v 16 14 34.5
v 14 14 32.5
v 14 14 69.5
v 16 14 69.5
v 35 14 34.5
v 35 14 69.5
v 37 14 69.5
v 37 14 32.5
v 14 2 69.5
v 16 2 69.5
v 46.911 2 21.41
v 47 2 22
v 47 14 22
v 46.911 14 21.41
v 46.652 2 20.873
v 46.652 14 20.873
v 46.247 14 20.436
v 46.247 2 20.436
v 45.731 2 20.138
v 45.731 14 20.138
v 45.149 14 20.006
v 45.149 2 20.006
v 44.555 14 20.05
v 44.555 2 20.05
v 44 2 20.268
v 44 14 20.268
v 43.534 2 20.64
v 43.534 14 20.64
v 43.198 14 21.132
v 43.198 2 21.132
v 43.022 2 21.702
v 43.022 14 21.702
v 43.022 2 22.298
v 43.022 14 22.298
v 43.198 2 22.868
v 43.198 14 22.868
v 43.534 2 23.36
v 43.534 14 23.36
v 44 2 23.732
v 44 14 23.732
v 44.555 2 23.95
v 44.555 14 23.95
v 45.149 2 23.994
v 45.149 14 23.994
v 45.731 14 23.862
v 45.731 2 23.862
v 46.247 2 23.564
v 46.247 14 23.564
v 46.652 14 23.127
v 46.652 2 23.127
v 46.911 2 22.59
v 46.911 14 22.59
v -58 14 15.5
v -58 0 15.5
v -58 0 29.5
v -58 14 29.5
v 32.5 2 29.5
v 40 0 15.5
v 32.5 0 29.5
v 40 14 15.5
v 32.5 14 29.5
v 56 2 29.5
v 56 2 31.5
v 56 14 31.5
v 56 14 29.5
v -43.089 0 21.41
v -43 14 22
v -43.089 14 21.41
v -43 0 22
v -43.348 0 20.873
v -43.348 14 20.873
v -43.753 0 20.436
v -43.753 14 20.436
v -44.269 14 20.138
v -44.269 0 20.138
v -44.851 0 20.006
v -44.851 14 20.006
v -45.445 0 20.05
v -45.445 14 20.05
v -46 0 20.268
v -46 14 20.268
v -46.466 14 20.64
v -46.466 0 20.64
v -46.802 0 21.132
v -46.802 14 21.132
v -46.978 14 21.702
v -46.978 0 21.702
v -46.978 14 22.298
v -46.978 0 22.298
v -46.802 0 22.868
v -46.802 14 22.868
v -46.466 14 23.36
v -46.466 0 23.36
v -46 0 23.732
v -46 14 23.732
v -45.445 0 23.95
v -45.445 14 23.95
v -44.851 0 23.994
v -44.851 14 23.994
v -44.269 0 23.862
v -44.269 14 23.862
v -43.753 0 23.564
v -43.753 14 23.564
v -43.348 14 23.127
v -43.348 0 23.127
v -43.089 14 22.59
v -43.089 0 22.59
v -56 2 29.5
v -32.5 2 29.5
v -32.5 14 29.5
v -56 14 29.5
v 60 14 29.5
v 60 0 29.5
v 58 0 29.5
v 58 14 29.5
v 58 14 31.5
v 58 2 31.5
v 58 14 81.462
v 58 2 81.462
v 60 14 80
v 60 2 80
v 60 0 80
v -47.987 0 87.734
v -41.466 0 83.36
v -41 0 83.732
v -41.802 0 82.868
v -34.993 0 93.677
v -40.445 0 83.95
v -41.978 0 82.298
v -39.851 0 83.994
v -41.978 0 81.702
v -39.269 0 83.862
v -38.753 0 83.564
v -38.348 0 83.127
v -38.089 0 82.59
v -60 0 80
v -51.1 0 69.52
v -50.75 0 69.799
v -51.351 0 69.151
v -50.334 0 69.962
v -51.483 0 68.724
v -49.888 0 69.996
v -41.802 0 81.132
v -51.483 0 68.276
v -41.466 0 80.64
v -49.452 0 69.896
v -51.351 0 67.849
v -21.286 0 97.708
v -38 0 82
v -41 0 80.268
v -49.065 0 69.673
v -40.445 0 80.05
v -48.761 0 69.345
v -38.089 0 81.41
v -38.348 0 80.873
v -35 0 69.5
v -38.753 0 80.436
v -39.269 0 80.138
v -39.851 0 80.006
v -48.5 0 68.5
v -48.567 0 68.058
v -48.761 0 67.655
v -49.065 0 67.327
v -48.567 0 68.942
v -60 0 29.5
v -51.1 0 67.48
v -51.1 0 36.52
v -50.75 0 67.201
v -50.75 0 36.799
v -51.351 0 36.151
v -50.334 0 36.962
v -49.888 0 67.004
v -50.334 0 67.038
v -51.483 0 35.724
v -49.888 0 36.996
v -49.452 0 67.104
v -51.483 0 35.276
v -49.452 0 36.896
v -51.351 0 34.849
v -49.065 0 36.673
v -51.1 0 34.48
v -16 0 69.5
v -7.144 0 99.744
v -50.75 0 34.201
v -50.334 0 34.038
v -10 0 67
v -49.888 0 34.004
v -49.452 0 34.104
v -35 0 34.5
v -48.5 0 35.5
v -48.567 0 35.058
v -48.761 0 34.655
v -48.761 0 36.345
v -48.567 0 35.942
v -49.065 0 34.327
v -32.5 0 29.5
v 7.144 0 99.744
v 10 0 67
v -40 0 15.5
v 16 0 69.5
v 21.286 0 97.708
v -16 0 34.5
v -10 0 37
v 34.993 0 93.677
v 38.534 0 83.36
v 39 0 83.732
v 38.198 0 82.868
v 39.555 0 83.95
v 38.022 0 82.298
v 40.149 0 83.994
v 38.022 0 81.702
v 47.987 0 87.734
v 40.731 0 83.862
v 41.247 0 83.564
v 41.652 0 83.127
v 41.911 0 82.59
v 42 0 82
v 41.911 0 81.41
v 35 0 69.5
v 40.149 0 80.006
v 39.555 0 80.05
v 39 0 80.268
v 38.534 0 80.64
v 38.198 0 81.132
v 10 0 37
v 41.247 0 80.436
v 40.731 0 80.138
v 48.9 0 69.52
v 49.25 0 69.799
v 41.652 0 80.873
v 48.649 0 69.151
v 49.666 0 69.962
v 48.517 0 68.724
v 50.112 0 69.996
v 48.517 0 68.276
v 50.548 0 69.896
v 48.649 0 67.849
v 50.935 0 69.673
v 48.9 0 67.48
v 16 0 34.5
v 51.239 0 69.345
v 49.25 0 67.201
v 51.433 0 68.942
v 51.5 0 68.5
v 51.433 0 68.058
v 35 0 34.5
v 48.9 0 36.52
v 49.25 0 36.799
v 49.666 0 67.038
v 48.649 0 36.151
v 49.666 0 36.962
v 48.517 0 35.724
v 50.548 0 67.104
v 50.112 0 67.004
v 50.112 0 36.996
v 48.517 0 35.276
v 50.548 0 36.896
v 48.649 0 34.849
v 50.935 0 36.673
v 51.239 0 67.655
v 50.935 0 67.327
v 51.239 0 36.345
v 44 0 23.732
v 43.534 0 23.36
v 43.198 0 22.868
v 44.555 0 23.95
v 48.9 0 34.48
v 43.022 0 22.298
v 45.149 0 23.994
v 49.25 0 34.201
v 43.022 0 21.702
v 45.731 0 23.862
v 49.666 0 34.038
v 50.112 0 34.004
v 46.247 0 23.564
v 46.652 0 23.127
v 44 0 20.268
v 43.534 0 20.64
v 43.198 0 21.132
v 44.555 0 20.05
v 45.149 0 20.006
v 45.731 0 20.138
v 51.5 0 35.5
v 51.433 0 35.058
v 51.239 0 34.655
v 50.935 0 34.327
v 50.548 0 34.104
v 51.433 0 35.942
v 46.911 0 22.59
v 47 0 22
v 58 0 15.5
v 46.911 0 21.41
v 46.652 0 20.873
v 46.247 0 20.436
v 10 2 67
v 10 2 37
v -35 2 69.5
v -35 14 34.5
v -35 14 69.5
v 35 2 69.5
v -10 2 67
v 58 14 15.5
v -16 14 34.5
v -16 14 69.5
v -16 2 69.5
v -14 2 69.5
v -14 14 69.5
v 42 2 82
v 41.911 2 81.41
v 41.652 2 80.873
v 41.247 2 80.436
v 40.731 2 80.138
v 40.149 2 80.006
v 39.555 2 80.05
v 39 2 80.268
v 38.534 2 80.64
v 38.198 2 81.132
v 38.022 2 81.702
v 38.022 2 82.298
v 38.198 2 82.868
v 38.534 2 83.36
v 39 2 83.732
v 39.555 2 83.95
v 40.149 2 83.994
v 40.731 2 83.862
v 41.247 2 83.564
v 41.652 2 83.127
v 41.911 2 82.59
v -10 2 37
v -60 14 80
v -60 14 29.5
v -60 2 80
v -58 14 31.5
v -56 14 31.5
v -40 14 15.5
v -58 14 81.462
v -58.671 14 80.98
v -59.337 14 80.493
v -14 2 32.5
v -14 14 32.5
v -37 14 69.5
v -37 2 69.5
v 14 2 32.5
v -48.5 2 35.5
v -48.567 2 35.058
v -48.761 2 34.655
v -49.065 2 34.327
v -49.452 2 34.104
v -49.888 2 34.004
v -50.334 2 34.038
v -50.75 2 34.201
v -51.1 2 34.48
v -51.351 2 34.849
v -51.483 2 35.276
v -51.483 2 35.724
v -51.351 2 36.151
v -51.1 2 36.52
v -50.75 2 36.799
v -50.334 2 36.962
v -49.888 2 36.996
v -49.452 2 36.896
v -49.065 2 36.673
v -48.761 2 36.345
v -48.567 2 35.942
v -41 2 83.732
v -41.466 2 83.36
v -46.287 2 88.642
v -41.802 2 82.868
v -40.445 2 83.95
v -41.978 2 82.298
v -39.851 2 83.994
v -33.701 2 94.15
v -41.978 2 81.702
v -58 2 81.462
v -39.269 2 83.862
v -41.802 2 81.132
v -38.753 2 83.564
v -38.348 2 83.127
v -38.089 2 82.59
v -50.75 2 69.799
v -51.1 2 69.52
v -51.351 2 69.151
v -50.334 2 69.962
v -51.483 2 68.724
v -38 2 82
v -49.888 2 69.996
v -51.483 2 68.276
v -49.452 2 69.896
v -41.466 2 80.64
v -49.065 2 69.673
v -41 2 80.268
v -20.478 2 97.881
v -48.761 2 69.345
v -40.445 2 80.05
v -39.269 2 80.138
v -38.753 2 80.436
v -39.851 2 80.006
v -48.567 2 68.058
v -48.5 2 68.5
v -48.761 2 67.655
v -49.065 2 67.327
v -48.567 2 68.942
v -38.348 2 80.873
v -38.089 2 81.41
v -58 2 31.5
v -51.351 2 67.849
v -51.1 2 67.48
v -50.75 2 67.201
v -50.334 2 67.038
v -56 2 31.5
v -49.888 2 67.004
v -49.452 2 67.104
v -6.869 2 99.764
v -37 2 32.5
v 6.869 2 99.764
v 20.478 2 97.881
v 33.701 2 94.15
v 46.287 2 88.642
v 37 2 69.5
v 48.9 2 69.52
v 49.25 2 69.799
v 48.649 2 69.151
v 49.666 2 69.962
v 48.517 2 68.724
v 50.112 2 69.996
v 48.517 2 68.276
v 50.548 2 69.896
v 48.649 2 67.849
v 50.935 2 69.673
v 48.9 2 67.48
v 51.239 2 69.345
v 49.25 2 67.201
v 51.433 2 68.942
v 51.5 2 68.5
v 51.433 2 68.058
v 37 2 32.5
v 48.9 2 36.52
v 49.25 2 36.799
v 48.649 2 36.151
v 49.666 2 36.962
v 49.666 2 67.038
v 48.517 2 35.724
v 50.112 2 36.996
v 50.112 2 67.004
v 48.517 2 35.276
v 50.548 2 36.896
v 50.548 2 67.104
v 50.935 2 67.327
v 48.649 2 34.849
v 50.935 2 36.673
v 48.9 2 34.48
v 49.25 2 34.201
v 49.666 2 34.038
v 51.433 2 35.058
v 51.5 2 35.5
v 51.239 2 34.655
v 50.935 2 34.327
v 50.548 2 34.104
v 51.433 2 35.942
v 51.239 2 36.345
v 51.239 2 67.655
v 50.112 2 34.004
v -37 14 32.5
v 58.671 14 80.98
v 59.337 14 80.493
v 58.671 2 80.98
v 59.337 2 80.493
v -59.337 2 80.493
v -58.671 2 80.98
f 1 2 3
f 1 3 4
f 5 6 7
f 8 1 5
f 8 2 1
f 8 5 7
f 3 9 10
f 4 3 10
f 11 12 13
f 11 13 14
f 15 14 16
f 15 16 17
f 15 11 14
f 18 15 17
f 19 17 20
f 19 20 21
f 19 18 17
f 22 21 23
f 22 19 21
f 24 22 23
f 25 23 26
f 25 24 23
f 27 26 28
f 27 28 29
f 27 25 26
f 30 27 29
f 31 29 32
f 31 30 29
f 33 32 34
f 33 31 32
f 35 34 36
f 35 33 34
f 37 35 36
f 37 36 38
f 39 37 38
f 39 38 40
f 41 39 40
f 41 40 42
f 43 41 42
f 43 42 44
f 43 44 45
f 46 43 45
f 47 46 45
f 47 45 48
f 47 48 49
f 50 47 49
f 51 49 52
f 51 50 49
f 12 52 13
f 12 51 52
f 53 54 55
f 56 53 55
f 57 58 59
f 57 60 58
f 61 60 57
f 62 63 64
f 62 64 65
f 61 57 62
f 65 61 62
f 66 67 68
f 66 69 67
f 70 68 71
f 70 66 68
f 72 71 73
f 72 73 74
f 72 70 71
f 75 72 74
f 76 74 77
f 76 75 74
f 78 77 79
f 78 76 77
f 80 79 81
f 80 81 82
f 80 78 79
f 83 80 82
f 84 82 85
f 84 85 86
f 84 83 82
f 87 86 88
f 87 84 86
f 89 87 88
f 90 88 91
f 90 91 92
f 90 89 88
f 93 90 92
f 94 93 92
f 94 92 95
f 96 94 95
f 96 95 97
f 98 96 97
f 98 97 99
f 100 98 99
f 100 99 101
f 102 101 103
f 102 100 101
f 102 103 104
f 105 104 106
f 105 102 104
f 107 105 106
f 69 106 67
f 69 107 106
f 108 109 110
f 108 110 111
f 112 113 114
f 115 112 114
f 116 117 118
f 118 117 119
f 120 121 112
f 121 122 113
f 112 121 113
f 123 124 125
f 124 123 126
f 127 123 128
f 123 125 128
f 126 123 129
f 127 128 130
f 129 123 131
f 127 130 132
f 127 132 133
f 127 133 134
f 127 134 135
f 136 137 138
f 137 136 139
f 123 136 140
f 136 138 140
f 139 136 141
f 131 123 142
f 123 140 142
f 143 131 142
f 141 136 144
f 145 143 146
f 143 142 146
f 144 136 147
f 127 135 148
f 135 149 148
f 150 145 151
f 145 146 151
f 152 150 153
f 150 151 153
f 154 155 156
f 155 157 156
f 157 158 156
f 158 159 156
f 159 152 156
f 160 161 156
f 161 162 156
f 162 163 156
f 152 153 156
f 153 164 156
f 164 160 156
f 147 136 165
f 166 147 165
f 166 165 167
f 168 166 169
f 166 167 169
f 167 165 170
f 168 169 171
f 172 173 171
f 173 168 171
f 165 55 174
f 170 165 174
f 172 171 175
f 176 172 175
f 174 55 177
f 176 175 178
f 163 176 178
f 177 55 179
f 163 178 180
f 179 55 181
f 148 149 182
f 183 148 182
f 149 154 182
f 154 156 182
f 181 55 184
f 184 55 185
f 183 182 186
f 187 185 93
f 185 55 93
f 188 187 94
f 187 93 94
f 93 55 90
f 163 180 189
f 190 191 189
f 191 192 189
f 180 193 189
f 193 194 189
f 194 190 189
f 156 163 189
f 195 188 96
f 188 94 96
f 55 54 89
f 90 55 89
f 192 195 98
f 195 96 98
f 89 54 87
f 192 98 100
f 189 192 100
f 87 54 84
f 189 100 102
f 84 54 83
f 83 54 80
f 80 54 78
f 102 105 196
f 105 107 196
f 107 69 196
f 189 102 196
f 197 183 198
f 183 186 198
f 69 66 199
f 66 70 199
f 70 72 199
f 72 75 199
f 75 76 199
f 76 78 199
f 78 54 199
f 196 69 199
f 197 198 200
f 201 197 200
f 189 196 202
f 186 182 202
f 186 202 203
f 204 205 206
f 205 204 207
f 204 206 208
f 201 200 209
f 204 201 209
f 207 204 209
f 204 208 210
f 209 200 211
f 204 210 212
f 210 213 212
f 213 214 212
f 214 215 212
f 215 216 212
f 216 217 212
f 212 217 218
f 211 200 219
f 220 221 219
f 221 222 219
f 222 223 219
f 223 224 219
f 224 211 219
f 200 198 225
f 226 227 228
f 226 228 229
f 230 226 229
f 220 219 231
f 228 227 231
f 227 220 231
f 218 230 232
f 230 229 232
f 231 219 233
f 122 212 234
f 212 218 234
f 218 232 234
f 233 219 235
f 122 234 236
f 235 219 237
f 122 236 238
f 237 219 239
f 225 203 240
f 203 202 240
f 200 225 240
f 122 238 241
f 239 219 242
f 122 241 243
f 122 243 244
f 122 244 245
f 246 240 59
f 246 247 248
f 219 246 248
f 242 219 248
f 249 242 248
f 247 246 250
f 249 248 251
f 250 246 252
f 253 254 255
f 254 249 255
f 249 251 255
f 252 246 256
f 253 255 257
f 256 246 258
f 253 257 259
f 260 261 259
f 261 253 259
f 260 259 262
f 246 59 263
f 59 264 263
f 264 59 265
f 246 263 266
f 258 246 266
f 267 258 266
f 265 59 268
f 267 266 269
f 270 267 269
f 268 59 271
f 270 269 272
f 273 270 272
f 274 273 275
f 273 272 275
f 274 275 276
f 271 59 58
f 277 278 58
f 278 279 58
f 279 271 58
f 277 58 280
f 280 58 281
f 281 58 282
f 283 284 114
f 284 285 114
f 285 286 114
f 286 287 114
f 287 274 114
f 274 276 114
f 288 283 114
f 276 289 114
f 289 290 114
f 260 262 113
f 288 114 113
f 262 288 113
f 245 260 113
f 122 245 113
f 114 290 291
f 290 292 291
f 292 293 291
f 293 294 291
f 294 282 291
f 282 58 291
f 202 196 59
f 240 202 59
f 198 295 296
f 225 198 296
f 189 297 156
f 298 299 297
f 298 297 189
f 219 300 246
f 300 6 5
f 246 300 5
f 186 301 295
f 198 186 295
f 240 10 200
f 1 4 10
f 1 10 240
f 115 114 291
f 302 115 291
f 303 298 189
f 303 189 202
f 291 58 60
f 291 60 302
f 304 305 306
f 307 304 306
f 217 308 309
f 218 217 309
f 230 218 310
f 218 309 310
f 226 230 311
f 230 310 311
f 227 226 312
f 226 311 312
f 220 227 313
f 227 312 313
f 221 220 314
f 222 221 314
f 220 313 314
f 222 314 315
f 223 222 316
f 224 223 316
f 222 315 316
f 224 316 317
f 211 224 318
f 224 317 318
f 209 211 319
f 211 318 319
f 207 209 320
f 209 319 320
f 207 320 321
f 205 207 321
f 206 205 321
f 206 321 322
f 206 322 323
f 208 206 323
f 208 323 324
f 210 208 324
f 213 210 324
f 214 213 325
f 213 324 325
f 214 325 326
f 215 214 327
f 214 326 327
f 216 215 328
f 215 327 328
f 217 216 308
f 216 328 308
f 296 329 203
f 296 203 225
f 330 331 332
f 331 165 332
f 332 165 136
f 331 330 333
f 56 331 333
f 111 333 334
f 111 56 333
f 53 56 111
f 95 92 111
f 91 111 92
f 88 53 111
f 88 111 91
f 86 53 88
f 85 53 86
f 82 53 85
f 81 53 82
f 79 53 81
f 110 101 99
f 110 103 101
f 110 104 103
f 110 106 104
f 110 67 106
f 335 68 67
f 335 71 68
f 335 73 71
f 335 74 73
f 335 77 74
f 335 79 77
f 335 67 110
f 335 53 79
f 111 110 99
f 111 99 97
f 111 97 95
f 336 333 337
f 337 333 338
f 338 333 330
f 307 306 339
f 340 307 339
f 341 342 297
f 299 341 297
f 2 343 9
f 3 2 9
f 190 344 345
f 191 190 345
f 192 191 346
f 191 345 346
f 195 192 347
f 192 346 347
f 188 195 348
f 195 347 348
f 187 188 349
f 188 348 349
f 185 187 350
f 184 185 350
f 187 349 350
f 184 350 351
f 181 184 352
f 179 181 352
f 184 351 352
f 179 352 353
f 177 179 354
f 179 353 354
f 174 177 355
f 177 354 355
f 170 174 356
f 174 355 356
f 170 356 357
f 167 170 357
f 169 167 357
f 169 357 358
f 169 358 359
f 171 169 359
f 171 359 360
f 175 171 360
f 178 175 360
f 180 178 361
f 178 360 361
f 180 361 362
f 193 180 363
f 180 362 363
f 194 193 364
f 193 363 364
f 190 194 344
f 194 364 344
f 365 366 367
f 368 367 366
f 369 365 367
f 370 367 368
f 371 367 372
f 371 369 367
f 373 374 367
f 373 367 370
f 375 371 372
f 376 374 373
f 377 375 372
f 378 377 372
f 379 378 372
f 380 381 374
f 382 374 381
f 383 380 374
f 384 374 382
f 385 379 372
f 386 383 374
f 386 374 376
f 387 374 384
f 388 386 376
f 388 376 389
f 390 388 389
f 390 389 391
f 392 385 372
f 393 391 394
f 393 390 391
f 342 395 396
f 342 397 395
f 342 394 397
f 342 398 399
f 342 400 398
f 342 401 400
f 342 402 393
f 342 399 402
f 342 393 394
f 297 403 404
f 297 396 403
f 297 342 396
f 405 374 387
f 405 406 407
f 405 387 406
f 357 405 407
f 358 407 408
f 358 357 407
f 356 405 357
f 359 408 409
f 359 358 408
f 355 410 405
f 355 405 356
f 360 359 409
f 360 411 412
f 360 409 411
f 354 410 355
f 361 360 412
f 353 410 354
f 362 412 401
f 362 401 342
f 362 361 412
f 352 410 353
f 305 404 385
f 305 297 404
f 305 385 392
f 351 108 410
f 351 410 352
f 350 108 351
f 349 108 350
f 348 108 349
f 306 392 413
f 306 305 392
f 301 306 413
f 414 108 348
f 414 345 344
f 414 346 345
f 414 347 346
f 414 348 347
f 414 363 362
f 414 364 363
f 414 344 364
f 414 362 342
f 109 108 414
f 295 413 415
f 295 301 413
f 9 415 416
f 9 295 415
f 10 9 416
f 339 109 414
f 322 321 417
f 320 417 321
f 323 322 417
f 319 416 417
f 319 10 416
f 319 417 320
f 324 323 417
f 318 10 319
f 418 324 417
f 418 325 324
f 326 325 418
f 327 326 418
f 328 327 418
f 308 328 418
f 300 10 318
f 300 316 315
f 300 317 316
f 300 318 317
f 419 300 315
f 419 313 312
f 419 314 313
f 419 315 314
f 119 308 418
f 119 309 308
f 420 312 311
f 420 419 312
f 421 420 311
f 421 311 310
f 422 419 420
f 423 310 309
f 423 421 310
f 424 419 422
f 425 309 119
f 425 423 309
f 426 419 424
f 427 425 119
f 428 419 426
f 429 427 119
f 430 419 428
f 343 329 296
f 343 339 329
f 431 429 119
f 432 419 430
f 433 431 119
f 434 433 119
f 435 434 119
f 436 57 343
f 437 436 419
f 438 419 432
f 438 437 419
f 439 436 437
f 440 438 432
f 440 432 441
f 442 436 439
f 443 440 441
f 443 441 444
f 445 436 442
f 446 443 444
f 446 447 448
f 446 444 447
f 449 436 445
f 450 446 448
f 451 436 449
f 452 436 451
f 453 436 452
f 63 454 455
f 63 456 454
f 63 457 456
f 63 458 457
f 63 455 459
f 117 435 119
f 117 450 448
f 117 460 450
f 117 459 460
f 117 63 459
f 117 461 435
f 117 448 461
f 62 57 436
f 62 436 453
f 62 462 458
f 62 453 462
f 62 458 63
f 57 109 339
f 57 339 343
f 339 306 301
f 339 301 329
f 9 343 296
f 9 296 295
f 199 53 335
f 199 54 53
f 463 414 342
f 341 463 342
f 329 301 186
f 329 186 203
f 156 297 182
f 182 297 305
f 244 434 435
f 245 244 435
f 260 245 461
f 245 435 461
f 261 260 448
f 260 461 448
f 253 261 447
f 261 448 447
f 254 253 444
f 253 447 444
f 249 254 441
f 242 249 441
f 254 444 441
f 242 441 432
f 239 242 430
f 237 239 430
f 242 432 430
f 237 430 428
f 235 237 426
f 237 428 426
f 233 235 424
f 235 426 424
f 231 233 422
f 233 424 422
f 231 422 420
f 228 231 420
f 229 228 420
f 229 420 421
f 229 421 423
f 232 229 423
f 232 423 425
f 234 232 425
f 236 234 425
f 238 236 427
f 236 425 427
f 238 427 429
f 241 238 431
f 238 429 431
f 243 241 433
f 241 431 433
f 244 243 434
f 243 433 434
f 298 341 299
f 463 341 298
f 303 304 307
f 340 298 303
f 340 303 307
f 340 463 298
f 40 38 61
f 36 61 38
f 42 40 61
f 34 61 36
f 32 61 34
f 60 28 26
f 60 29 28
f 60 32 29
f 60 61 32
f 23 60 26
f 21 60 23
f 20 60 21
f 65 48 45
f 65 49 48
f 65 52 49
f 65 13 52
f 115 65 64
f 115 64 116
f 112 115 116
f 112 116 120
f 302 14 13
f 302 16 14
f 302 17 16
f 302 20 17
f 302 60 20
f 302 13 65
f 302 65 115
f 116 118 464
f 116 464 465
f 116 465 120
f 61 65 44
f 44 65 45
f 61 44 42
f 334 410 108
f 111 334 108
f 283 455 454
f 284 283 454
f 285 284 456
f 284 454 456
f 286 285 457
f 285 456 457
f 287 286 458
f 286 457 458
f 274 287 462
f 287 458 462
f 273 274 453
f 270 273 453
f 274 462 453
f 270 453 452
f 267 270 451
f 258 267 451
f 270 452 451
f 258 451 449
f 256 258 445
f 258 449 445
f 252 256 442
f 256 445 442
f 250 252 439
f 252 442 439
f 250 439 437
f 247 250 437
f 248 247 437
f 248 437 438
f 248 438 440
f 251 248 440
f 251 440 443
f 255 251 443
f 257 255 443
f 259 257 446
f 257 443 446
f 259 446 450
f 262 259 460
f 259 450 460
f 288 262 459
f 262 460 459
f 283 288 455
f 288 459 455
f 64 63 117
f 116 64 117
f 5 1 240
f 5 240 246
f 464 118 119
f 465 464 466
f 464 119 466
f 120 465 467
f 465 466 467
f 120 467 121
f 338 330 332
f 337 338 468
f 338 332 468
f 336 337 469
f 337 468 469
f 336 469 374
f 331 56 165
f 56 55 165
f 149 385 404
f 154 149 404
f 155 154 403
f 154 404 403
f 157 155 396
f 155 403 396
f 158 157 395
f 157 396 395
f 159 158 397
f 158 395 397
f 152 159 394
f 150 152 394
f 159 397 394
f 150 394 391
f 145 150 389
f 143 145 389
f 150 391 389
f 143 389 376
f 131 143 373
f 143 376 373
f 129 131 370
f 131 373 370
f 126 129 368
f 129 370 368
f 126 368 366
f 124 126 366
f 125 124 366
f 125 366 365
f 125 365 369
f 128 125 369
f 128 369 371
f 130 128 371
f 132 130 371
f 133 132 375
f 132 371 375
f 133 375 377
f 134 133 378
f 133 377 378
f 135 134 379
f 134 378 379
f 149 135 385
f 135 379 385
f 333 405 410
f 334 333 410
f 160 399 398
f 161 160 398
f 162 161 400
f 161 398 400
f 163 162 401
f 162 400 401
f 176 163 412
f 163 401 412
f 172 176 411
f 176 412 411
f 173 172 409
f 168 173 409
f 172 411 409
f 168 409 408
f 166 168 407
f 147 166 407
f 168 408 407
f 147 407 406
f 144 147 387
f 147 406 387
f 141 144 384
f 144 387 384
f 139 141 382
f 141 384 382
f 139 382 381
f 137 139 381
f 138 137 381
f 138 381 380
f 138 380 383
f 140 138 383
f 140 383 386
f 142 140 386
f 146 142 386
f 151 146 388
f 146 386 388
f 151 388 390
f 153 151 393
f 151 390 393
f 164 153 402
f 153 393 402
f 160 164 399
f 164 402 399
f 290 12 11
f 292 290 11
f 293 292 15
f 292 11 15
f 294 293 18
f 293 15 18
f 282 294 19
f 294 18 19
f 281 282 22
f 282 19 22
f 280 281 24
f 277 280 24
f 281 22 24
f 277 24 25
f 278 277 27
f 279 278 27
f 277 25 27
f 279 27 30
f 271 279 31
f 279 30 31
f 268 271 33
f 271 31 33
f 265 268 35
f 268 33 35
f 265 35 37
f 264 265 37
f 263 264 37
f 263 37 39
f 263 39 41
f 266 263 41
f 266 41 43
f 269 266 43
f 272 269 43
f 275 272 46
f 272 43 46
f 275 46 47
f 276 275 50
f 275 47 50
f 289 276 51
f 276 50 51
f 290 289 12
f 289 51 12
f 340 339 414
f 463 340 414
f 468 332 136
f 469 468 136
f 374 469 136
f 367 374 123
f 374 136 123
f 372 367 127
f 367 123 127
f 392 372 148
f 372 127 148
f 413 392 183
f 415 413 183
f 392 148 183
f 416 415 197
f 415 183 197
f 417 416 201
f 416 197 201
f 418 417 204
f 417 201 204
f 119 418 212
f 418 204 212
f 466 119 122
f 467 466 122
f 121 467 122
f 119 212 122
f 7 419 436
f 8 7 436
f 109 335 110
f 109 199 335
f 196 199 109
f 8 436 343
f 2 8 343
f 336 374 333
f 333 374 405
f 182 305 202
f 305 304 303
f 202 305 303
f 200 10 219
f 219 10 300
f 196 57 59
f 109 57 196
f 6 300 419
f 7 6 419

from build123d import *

# Parameters (mm, degrees)
SKETCH_1_W                  = 116
SKETCH_1_H                  = 14
EXTRUDE_763_DEPTH           = 2
CUT_EXTRUDE_1069_DEPTH      = 2
SKETCH_5_W                  = 19
SKETCH_5_H                  = 35
SKETCH_5_W_2                = 20
SKETCH_5_H_2                = 30
CUT_EXTRUDE_1759_DEPTH      = 2
EXTRUDE_3355_DEPTH          = 12
SKETCH_7_W                  = 2
SKETCH_7_H                  = 2
EXTRUDE_4350_DEPTH          = 12
SKETCH_2_R                  = 2
SKETCH_2_R_2                = 1.5
CUT_EXTRUDE_5250_DEPTH      = 12
CUT_EXTRUDE_5250_DEPTH_BACK = 2


with BuildPart() as part:
    # 草图1 → Extrude 763 (new body)
    with BuildSketch(Plane(origin=(0, 0, 0), x_dir=(1, 0, 0), z_dir=(0, 1, 0))):
        with BuildLine():
            Line((-60, -29.5), (-60, -80))
            ThreePointArc((-60, -80), (0, -100), (60, -80))
            Line((60, -80), (60, -29.5))
            Line((60, -29.5), (58, -29.5))
            Line((58, -29.5), (-58, -29.5))
            Line((-58, -29.5), (-60, -29.5))
        make_face()
        with Locations((0, -22.5)):
            Rectangle(SKETCH_1_W, SKETCH_1_H)
    extrude(amount=EXTRUDE_763_DEPTH)

    # 草图3 → Cut-Extrude 1069 (cut)
    with BuildSketch(Plane(origin=(0, 2, 0), x_dir=(1, 0, 0), z_dir=(0, 1, 0))):
        Polygon((-40, -15.5), (40, -15.5), (32.5, -29.5), (-32.5, -29.5), align=None)
    extrude(amount=-CUT_EXTRUDE_1069_DEPTH, mode=Mode.SUBTRACT)

    # 草图5 → Cut-Extrude 1759 (cut)
    with BuildSketch(Plane(origin=(0, 2, 0), x_dir=(1, 0, 0), z_dir=(0, 1, 0))):
        with Locations((-25.5, -52)):
            Rectangle(SKETCH_5_W, SKETCH_5_H)
        with Locations((25.5, -52)):
            Rectangle(SKETCH_5_W, SKETCH_5_H)
        with Locations((0, -52)):
            Rectangle(SKETCH_5_W_2, SKETCH_5_H_2)
    extrude(amount=-CUT_EXTRUDE_1759_DEPTH, mode=Mode.SUBTRACT)

    # 草图6 → Extrude 3355 (add)
    with BuildSketch(Plane(origin=(0, 2, 0), x_dir=(1, 0, 0), z_dir=(0, 1, 0))):
        with BuildLine():
            Line((-58, -81.461647418), (-58, -29.5))
            Line((-58, -29.5), (-60, -29.5))
            Line((-60, -29.5), (-60, -80))
            ThreePointArc((-60, -80), (-59.004526125, -80.737016893), (-58, -81.461647418))
        make_face()
        with BuildLine():
            Line((60, -29.5), (58, -29.5))
            Line((58, -29.5), (58, -81.461647418))
            ThreePointArc((58, -81.461647418), (59.004526125, -80.737016893), (60, -80))
            Line((60, -80), (60, -29.5))
        make_face()
        Polygon((-37, -32.5), (-37, -69.5), (-35, -69.5), (-35, -34.5), (-16, -34.5), (-16, -69.5), (-14, -69.5), (-14, -32.5), align=None)
        Polygon((35, -69.5), (37, -69.5), (37, -32.5), (14, -32.5), (14, -69.5), (16, -69.5), (16, -34.5), (35, -34.5), align=None)
    extrude(amount=EXTRUDE_3355_DEPTH)

    # 草图7 → Extrude 4350 (add)
    with BuildSketch(Plane(origin=(0, 2, 0), x_dir=(1, 0, 0), z_dir=(0, 1, 0))):
        with Locations((-57, -30.5)):
            Rectangle(SKETCH_7_W, SKETCH_7_H)
        Polygon((-32.5, -29.5), (-58, -29.5), (-58, -15.5), (-40, -15.5), align=None)
        with Locations((57, -30.5)):
            Rectangle(SKETCH_7_W, SKETCH_7_H)
        Polygon((32.5, -29.5), (58, -29.5), (58, -15.5), (40, -15.5), align=None)
    extrude(amount=EXTRUDE_4350_DEPTH)

    # 草图2 → Cut-Extrude 5250 (cut, two sides)
    with BuildSketch(Plane(origin=(0, 2, 0), x_dir=(1, 0, 0), z_dir=(0, 1, 0))) as cut_extrude_5250_sk:
        with Locations((-45, -22)):
            Circle(SKETCH_2_R)
        with Locations((-40, -82)):
            Circle(SKETCH_2_R)
        with Locations((40, -82)):
            Circle(SKETCH_2_R)
        with Locations((45, -22)):
            Circle(SKETCH_2_R)
        with Locations((-50, -35.5)):
            Circle(SKETCH_2_R_2)
        with Locations((-50, -68.5)):
            Circle(SKETCH_2_R_2)
        with Locations((50, -68.5)):
            Circle(SKETCH_2_R_2)
        with Locations((50, -35.5)):
            Circle(SKETCH_2_R_2)
    extrude(amount=CUT_EXTRUDE_5250_DEPTH, mode=Mode.SUBTRACT)
    extrude(cut_extrude_5250_sk.sketch, amount=-CUT_EXTRUDE_5250_DEPTH_BACK, mode=Mode.SUBTRACT)


solid = part.part
